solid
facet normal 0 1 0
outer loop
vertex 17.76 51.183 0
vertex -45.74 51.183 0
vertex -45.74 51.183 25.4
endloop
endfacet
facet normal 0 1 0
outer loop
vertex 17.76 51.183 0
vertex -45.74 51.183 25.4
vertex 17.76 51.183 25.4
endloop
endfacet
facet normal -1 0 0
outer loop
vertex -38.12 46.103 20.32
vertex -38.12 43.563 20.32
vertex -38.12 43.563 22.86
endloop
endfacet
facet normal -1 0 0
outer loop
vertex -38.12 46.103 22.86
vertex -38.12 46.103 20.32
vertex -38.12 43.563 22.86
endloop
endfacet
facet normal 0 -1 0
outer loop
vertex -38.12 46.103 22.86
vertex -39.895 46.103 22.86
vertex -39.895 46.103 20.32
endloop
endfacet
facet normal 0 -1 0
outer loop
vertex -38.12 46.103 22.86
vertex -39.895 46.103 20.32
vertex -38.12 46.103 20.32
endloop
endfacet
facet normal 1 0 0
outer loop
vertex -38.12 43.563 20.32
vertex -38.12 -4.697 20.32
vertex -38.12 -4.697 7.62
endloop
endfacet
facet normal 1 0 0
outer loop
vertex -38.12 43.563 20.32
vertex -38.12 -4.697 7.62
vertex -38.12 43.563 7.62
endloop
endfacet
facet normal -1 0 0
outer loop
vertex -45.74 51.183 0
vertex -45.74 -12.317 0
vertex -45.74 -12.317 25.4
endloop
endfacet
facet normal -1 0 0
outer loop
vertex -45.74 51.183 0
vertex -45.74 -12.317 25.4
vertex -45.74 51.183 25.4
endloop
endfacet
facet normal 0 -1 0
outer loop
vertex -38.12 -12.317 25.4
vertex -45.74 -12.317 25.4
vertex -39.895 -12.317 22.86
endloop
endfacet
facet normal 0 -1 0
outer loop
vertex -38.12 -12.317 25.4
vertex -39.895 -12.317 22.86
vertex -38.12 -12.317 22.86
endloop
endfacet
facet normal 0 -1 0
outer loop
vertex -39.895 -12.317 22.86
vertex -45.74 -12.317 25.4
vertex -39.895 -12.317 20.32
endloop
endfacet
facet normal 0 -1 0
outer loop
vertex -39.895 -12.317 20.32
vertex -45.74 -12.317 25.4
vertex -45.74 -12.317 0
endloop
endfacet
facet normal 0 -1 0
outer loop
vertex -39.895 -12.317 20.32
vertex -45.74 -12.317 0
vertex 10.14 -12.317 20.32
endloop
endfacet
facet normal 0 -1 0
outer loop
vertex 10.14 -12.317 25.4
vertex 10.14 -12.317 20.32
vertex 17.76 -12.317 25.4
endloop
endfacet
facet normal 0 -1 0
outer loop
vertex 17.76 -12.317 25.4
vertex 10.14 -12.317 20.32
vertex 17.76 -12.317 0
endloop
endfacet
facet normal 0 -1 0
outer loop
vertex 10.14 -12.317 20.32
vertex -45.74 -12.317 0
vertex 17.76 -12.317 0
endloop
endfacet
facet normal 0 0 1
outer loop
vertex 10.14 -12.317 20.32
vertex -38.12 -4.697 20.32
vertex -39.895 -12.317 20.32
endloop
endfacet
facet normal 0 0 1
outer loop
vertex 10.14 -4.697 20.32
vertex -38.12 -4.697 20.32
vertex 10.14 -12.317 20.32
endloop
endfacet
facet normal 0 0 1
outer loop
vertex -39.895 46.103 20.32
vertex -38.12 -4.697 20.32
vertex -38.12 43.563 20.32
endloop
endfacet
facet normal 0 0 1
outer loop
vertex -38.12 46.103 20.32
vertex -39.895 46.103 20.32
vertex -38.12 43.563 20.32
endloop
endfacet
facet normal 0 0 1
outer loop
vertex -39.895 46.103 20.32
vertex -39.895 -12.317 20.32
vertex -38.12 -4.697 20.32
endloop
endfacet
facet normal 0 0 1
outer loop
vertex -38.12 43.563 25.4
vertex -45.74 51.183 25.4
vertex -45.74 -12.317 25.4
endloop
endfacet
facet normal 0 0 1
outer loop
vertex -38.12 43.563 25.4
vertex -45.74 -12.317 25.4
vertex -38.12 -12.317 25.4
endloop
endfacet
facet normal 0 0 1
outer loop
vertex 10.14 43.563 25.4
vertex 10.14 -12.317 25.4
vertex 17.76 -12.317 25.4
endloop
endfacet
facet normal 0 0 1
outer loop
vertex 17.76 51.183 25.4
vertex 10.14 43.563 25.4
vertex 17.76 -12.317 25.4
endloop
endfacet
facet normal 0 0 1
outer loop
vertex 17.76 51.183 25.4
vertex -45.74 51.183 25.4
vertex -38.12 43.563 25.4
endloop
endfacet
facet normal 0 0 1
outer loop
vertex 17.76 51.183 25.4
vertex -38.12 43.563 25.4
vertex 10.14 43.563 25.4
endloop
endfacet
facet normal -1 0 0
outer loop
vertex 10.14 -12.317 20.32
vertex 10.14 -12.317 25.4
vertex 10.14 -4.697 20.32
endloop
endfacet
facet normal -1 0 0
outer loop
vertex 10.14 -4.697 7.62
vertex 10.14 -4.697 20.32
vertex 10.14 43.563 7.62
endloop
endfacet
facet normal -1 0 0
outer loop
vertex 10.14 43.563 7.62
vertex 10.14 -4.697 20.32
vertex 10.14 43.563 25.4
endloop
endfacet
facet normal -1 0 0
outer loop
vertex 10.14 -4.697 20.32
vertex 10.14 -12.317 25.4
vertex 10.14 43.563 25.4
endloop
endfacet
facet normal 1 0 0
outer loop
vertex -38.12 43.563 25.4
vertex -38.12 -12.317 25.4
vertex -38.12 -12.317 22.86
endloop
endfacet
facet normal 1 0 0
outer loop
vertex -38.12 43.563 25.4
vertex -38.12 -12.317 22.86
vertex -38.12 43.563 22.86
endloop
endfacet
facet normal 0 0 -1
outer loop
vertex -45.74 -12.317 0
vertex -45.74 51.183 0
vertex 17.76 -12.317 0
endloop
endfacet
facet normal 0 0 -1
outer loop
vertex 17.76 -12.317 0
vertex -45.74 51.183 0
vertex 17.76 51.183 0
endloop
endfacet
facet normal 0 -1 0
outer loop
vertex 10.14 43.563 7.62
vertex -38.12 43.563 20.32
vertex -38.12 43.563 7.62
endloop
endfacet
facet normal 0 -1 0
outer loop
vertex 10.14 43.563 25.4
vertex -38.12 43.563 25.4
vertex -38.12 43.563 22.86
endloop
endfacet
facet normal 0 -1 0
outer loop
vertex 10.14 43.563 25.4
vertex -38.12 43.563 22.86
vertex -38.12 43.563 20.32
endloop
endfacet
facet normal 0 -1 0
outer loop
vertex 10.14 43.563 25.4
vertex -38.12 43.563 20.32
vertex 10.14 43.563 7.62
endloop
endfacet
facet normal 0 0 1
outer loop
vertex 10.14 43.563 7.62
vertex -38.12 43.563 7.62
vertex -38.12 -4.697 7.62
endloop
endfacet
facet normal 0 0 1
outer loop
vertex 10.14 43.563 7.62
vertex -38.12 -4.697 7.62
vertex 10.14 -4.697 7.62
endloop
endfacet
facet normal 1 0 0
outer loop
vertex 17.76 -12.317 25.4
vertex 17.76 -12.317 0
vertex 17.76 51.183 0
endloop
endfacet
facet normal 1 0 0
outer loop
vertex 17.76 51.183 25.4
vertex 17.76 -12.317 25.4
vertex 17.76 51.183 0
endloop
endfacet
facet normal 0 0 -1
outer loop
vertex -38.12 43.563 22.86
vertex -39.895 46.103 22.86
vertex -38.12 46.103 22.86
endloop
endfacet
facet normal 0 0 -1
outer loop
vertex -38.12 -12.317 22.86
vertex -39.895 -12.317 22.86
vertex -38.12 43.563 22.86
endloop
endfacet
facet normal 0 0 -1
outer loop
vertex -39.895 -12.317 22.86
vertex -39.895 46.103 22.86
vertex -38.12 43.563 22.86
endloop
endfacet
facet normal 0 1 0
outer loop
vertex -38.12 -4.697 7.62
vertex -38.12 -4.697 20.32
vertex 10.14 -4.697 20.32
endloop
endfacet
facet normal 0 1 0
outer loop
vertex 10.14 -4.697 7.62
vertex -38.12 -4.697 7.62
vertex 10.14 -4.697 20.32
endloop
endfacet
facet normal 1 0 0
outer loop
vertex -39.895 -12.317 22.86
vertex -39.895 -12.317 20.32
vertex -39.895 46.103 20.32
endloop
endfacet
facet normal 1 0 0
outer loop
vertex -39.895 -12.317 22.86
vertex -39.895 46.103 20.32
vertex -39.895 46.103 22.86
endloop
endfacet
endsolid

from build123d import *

# Parameters (mm, degrees)
F0_W     = 63.5
F0_H     = 63.5
F1_DEPTH = 25.4
F2_W     = 48.26
F2_H     = 48.26
F3_DEPTH = 17.78
F4_W     = 48.26
F4_H     = 7.62
F5_DEPTH = 5.08
F6_W     = 1.774852
F6_H     = 2.54
F7_DEPTH = 58.42


with BuildPart() as f1:
    # F0 (on Top) → F1 (new body)
    with BuildSketch(Plane.XY):
        with Locations((-13.989703, 19.433425)):
            Rectangle(F0_W, F0_H)
    extrude(amount=F1_DEPTH)

    # F2 (on face) → F3 (cut)
    with BuildSketch(Plane.XY.offset(25.4)):
        with Locations((-13.989703, 19.433425)):
            Rectangle(F2_W, F2_H)
    extrude(amount=-F3_DEPTH, mode=Mode.SUBTRACT)

    # F4 (on face) → F5 (cut)
    with BuildSketch(Plane.XY.offset(25.4)):
        with Locations((-13.989703, -8.506575)):
            Rectangle(F4_W, F4_H)
    extrude(amount=-F5_DEPTH, mode=Mode.SUBTRACT)

    # F6 (on face) → F7 (cut)
    with BuildSketch(Plane.XZ.offset(12.316575)):
        with Locations((-39.007129, 21.59)):
            Rectangle(F6_W, F6_H)
    extrude(amount=-F7_DEPTH, mode=Mode.SUBTRACT)


solid = f1.part
